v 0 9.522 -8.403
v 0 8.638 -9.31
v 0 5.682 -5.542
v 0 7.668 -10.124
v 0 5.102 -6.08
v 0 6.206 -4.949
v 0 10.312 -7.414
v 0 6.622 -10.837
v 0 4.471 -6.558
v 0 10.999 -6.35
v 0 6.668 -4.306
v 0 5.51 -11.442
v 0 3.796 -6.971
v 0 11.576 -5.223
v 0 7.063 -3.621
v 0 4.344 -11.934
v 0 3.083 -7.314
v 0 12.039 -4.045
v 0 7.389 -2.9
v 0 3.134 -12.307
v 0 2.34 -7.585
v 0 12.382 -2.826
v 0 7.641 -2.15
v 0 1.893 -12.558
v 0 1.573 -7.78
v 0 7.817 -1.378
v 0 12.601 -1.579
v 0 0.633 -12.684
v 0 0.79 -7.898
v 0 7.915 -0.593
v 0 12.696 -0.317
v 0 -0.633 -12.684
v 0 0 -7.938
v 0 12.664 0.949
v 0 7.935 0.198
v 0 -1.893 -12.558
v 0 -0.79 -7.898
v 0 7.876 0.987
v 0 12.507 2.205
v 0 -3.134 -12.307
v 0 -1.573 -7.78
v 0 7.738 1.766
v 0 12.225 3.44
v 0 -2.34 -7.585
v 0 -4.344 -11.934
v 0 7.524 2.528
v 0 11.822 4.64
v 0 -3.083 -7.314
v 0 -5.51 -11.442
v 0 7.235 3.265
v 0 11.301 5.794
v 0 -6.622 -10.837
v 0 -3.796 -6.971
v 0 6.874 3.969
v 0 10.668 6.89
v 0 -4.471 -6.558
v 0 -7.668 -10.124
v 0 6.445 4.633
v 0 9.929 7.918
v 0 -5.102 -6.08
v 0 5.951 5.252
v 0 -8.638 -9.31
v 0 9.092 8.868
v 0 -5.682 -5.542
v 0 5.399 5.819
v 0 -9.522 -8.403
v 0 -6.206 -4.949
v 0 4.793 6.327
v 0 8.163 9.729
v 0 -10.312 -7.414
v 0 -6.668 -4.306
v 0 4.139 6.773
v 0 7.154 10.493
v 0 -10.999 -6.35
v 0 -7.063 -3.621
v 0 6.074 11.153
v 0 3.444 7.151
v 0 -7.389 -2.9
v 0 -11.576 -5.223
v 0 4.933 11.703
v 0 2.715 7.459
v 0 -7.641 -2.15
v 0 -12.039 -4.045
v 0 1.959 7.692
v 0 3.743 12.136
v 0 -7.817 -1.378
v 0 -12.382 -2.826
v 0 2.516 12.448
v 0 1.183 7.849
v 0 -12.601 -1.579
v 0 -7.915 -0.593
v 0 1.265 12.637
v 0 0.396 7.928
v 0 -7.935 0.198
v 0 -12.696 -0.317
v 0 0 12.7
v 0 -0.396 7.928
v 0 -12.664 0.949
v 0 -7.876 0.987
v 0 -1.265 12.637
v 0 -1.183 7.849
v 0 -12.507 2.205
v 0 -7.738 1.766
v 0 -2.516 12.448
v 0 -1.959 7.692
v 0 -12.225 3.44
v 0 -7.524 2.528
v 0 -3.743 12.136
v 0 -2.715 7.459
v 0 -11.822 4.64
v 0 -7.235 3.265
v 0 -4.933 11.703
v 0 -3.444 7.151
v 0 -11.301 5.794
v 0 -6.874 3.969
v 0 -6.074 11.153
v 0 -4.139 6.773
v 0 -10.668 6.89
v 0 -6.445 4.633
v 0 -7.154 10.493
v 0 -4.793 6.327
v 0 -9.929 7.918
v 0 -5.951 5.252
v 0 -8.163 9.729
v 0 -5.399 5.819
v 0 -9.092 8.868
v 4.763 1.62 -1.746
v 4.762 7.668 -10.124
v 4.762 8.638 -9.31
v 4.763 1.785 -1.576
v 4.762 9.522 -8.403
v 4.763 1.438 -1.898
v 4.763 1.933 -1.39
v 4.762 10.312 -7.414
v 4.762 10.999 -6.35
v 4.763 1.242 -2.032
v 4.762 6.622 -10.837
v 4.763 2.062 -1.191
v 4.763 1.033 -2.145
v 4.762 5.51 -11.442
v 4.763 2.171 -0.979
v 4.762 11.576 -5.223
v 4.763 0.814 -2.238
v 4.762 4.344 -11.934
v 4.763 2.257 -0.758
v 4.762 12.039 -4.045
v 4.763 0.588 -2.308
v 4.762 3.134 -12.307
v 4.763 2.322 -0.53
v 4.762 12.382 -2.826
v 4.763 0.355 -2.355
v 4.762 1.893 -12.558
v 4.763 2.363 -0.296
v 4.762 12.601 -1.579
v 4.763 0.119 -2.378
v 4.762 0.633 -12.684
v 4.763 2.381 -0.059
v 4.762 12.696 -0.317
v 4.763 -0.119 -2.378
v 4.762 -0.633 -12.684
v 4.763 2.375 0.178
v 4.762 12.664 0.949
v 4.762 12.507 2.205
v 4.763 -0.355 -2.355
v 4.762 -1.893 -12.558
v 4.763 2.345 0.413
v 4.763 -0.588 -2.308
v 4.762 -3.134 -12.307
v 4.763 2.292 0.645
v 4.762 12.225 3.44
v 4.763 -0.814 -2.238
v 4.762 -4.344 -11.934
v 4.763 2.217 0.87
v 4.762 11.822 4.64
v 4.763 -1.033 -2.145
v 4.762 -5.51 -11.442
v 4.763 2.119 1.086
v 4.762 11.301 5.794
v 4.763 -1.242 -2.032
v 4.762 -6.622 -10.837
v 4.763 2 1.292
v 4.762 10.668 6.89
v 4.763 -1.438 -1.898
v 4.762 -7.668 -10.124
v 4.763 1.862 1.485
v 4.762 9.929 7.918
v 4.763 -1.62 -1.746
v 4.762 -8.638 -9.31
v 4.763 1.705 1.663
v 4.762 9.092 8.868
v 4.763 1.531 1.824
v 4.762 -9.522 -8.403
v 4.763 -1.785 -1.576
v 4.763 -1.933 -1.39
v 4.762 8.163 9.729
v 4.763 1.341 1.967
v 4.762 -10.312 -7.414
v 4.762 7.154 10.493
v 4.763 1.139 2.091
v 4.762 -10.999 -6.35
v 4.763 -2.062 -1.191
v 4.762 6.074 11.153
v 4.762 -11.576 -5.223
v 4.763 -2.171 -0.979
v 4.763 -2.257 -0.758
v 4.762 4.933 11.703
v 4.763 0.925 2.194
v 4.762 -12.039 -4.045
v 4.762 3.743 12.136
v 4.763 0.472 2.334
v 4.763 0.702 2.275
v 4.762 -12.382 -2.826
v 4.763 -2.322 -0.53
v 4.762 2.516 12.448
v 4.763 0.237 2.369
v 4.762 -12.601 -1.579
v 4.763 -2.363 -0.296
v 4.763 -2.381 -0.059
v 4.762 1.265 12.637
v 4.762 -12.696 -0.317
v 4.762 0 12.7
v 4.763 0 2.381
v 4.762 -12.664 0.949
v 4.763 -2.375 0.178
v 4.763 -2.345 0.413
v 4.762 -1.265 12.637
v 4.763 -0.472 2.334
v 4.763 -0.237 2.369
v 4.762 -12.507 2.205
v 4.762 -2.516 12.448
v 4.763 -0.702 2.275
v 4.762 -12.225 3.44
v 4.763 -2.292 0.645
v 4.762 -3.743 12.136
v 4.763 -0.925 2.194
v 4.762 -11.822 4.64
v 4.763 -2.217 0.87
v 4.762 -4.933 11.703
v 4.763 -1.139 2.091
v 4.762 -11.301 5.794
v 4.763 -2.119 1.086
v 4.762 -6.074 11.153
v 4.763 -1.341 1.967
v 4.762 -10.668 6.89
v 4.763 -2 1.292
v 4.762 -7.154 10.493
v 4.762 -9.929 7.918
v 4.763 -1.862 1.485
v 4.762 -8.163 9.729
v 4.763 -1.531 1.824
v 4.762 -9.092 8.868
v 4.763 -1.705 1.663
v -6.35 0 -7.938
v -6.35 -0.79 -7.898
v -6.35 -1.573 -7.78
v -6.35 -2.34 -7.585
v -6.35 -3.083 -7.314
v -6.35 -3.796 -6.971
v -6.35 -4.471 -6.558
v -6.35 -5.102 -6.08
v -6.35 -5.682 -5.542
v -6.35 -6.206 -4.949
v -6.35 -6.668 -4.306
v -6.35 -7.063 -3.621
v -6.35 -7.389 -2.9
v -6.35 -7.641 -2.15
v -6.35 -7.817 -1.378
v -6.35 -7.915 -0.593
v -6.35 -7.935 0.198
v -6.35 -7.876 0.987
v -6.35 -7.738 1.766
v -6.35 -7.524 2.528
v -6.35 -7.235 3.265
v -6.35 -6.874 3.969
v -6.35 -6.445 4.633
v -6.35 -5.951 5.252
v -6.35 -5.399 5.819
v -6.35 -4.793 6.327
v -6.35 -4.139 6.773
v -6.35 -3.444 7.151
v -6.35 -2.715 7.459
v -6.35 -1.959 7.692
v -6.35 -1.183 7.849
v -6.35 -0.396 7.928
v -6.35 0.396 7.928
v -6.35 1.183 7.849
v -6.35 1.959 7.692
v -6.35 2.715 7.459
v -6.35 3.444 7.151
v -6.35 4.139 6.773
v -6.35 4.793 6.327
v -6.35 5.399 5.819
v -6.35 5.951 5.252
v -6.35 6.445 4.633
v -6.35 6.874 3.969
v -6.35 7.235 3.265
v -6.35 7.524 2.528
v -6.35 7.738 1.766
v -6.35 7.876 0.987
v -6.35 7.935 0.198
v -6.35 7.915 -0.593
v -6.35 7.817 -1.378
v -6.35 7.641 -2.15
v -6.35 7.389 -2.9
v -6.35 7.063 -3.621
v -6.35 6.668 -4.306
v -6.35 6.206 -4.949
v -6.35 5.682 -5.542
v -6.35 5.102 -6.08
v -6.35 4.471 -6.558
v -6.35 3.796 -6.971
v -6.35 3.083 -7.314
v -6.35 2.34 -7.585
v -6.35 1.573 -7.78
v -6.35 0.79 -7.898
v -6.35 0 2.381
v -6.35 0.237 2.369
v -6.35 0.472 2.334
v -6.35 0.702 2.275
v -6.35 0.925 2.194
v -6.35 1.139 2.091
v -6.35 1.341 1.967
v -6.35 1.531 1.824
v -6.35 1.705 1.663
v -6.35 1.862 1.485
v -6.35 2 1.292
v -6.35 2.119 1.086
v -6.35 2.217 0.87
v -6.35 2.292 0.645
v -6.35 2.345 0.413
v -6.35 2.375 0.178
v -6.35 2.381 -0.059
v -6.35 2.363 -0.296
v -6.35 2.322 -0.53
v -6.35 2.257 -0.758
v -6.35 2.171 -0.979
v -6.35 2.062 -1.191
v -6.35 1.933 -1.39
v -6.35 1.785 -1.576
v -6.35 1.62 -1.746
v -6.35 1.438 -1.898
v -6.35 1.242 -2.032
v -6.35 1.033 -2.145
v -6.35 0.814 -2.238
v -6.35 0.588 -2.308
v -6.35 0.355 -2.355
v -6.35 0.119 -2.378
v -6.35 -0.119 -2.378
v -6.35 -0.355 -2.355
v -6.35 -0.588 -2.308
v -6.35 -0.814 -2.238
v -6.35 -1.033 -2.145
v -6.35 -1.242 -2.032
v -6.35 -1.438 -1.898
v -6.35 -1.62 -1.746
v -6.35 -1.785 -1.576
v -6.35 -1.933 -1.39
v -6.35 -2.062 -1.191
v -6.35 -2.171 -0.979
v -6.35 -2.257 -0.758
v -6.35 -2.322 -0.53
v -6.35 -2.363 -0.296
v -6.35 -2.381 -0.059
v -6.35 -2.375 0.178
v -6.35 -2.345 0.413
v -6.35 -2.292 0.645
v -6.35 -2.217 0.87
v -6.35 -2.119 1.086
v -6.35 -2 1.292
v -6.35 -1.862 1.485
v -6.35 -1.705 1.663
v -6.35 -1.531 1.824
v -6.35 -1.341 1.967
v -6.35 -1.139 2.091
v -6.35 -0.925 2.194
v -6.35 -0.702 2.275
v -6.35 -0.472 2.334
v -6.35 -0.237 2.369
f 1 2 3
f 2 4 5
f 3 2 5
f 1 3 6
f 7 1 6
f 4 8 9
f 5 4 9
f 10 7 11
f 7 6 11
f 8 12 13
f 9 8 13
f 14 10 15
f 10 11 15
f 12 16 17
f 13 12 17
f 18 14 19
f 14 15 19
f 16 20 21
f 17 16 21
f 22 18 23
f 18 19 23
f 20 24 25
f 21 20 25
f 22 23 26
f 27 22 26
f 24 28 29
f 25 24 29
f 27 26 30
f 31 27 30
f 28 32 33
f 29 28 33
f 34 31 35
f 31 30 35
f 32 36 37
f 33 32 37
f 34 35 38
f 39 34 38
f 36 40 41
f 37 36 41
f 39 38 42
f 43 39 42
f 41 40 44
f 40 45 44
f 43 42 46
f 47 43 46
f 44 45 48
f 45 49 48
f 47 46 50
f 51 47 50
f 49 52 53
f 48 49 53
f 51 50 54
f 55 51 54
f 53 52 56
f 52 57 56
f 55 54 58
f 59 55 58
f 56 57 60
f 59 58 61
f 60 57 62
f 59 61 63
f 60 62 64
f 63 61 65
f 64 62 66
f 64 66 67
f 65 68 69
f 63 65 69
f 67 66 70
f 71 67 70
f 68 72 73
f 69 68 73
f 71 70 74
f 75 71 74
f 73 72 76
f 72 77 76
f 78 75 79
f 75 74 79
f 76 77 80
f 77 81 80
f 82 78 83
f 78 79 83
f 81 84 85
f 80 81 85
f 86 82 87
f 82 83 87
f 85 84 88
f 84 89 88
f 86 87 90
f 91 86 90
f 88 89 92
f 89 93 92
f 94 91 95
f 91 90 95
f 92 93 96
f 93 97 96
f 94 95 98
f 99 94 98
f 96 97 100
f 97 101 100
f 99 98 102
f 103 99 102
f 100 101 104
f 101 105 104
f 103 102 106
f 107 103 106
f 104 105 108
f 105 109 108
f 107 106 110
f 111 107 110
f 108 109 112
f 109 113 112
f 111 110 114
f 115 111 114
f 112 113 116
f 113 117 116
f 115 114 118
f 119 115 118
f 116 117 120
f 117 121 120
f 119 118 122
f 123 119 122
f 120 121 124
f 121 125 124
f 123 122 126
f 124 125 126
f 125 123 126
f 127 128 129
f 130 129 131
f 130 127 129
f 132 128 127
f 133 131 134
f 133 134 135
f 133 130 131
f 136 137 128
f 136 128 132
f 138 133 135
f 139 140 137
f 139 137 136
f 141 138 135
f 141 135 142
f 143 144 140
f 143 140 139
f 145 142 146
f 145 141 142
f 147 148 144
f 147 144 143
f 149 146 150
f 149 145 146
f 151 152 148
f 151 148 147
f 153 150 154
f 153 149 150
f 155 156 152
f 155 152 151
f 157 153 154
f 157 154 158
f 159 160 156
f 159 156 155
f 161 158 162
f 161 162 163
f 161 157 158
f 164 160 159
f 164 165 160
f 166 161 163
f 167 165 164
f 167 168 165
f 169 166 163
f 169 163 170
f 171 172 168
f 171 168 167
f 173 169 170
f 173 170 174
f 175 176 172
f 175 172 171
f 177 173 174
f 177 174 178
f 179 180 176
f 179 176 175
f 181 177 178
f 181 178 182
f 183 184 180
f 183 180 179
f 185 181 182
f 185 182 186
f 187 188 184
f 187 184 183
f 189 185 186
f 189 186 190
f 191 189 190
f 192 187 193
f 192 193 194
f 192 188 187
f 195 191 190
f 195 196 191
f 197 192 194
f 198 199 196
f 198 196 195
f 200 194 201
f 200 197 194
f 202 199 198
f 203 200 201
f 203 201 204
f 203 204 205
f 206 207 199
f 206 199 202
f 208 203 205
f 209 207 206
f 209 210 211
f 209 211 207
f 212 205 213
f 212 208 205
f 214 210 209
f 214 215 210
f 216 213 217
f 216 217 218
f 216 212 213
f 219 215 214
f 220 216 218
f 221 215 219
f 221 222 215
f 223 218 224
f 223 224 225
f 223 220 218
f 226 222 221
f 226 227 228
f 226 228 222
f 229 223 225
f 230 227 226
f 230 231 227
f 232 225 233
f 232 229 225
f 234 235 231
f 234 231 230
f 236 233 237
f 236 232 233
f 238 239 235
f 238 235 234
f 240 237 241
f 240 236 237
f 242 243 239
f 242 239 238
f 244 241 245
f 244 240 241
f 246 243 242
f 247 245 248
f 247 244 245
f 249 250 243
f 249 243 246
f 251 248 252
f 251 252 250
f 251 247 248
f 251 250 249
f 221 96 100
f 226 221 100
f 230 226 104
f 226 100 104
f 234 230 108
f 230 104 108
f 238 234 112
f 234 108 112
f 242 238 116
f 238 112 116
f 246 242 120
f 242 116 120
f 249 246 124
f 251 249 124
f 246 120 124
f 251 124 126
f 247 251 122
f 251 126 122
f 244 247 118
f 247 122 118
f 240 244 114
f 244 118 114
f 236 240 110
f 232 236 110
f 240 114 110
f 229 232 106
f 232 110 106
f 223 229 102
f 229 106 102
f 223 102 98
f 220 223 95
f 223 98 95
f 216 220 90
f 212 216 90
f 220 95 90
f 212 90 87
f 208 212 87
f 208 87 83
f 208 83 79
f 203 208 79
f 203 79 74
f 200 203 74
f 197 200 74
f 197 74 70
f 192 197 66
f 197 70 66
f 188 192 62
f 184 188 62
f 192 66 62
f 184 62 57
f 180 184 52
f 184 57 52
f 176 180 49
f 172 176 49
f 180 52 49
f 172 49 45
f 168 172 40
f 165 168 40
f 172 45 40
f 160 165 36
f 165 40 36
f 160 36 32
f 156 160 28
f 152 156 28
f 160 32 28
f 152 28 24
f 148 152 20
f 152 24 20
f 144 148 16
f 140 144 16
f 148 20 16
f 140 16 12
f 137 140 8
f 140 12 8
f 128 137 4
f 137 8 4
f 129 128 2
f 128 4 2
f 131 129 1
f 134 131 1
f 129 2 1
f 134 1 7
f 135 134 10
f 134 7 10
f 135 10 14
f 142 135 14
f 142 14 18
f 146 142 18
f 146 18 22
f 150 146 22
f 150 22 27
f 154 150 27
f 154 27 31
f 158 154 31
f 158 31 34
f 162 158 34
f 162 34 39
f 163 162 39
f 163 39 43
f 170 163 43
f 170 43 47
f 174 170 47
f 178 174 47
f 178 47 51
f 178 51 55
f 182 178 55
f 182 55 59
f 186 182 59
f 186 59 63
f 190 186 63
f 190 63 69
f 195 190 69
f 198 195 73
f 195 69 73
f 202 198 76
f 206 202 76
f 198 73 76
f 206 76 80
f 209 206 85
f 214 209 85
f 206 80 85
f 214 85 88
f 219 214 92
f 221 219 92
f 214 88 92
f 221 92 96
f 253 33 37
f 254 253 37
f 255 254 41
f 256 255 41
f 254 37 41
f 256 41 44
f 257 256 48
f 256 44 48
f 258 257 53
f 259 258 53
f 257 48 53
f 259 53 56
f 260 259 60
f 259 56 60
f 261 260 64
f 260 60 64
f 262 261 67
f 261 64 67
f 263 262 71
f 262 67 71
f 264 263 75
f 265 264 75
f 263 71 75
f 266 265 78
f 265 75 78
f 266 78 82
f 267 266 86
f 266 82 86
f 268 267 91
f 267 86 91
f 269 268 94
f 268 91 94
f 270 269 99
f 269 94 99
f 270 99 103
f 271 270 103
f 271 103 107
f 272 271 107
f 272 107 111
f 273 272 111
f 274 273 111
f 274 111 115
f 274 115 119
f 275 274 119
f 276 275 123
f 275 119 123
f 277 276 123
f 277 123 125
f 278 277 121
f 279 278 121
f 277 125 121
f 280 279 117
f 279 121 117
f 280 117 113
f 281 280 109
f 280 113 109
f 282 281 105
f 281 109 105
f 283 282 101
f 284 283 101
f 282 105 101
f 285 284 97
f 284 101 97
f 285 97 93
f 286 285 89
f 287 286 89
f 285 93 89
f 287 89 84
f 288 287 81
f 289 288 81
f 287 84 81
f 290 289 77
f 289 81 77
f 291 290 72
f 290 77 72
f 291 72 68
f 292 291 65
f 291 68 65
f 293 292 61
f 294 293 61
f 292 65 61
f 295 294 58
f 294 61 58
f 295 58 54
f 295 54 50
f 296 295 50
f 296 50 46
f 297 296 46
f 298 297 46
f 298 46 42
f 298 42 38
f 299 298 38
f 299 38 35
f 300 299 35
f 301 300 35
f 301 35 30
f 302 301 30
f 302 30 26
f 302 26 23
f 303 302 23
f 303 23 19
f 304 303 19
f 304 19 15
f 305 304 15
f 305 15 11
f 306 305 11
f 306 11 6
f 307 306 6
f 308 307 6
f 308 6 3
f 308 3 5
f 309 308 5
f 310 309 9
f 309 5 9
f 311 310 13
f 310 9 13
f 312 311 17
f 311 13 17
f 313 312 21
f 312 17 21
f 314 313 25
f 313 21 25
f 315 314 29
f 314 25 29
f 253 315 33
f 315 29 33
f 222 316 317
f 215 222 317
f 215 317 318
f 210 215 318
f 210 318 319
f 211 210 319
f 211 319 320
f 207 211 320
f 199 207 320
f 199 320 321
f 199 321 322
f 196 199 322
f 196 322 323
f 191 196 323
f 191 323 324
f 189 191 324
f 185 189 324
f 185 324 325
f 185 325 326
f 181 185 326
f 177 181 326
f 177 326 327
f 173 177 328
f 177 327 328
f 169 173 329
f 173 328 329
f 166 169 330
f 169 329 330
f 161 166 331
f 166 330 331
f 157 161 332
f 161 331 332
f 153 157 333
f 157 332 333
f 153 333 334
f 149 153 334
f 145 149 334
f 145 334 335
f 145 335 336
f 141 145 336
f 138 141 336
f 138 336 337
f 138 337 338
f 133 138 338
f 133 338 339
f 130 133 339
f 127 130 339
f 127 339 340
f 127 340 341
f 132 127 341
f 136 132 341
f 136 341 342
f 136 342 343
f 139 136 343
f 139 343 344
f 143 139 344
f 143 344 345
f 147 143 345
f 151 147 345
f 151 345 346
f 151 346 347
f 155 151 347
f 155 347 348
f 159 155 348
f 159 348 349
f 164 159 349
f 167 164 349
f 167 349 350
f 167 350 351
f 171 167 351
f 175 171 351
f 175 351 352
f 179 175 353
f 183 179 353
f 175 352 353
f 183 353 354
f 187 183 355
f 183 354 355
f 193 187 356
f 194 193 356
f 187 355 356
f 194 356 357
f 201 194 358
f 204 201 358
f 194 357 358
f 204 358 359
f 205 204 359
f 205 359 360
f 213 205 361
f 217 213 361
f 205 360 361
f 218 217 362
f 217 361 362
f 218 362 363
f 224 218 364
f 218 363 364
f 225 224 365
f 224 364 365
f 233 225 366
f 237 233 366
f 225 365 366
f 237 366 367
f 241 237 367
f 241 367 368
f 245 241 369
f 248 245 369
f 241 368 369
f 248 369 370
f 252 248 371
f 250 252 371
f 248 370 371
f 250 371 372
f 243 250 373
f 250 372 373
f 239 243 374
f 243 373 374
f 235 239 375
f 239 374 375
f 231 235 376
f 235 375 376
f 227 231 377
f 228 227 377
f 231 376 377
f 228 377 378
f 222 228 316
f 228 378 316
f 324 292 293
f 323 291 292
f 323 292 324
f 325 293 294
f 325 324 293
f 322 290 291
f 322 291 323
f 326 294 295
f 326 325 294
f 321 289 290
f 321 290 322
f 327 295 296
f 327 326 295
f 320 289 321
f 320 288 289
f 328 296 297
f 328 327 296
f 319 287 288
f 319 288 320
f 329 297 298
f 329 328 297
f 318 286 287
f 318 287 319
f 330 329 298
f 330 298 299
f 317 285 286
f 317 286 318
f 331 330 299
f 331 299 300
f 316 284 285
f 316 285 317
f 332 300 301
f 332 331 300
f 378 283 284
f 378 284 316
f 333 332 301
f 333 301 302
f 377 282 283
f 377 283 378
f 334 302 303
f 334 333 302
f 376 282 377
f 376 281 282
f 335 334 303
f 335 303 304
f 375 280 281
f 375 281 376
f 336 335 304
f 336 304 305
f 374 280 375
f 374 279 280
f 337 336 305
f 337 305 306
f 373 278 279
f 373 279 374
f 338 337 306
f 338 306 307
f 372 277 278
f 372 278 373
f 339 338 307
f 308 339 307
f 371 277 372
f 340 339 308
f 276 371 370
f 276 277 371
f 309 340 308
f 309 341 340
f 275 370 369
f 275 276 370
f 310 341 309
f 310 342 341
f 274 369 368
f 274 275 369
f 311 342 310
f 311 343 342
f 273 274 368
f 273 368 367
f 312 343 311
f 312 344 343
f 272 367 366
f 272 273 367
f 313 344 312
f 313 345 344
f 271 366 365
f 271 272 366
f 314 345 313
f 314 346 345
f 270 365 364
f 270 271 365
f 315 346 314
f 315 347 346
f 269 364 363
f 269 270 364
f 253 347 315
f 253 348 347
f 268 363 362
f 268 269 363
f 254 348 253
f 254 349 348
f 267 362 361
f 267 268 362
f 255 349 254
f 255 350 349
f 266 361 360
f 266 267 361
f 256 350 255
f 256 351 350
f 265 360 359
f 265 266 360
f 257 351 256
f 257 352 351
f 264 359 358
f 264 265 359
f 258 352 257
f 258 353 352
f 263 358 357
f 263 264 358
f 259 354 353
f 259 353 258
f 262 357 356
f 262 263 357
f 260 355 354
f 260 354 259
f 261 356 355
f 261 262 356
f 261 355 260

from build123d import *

# Parameters (mm, degrees)
SKETCH1_R             = 12.7
BOSS_EXTRUDE1_DEPTH   = 4.7625
SKETCH2_R             = 7.9375
BOSS_EXTRUDE2_DEPTH   = 6.35
F_4_CLEARANCE_HOLE1_D = 4.7625


with BuildPart() as part:
    # Sketch1 → Boss-Extrude1 (new body)
    with BuildSketch(Plane(origin=(0, 0, 0), x_dir=(0, 0, -1), z_dir=(1, 0, 0))):
        with Locations(Location((0, 0, 0), (0, 0, 180))):
            Circle(SKETCH1_R)
    extrude(amount=BOSS_EXTRUDE1_DEPTH)

    # Sketch2 → Boss-Extrude2 (add)
    with BuildSketch(Plane.ZY):
        with Locations(Location((0, 0, 0), (0, 0, 180))):
            Circle(SKETCH2_R)
    extrude(amount=BOSS_EXTRUDE2_DEPTH)

    # #4 Clearance Hole1 (through all)
    with Locations(Plane(origin=(4.7625, 0, 0), x_dir=(0, 0, -1), z_dir=(1, 0, 0))):
        with Locations((0, 0)):
            Hole(F_4_CLEARANCE_HOLE1_D / 2)


solid = part.part
